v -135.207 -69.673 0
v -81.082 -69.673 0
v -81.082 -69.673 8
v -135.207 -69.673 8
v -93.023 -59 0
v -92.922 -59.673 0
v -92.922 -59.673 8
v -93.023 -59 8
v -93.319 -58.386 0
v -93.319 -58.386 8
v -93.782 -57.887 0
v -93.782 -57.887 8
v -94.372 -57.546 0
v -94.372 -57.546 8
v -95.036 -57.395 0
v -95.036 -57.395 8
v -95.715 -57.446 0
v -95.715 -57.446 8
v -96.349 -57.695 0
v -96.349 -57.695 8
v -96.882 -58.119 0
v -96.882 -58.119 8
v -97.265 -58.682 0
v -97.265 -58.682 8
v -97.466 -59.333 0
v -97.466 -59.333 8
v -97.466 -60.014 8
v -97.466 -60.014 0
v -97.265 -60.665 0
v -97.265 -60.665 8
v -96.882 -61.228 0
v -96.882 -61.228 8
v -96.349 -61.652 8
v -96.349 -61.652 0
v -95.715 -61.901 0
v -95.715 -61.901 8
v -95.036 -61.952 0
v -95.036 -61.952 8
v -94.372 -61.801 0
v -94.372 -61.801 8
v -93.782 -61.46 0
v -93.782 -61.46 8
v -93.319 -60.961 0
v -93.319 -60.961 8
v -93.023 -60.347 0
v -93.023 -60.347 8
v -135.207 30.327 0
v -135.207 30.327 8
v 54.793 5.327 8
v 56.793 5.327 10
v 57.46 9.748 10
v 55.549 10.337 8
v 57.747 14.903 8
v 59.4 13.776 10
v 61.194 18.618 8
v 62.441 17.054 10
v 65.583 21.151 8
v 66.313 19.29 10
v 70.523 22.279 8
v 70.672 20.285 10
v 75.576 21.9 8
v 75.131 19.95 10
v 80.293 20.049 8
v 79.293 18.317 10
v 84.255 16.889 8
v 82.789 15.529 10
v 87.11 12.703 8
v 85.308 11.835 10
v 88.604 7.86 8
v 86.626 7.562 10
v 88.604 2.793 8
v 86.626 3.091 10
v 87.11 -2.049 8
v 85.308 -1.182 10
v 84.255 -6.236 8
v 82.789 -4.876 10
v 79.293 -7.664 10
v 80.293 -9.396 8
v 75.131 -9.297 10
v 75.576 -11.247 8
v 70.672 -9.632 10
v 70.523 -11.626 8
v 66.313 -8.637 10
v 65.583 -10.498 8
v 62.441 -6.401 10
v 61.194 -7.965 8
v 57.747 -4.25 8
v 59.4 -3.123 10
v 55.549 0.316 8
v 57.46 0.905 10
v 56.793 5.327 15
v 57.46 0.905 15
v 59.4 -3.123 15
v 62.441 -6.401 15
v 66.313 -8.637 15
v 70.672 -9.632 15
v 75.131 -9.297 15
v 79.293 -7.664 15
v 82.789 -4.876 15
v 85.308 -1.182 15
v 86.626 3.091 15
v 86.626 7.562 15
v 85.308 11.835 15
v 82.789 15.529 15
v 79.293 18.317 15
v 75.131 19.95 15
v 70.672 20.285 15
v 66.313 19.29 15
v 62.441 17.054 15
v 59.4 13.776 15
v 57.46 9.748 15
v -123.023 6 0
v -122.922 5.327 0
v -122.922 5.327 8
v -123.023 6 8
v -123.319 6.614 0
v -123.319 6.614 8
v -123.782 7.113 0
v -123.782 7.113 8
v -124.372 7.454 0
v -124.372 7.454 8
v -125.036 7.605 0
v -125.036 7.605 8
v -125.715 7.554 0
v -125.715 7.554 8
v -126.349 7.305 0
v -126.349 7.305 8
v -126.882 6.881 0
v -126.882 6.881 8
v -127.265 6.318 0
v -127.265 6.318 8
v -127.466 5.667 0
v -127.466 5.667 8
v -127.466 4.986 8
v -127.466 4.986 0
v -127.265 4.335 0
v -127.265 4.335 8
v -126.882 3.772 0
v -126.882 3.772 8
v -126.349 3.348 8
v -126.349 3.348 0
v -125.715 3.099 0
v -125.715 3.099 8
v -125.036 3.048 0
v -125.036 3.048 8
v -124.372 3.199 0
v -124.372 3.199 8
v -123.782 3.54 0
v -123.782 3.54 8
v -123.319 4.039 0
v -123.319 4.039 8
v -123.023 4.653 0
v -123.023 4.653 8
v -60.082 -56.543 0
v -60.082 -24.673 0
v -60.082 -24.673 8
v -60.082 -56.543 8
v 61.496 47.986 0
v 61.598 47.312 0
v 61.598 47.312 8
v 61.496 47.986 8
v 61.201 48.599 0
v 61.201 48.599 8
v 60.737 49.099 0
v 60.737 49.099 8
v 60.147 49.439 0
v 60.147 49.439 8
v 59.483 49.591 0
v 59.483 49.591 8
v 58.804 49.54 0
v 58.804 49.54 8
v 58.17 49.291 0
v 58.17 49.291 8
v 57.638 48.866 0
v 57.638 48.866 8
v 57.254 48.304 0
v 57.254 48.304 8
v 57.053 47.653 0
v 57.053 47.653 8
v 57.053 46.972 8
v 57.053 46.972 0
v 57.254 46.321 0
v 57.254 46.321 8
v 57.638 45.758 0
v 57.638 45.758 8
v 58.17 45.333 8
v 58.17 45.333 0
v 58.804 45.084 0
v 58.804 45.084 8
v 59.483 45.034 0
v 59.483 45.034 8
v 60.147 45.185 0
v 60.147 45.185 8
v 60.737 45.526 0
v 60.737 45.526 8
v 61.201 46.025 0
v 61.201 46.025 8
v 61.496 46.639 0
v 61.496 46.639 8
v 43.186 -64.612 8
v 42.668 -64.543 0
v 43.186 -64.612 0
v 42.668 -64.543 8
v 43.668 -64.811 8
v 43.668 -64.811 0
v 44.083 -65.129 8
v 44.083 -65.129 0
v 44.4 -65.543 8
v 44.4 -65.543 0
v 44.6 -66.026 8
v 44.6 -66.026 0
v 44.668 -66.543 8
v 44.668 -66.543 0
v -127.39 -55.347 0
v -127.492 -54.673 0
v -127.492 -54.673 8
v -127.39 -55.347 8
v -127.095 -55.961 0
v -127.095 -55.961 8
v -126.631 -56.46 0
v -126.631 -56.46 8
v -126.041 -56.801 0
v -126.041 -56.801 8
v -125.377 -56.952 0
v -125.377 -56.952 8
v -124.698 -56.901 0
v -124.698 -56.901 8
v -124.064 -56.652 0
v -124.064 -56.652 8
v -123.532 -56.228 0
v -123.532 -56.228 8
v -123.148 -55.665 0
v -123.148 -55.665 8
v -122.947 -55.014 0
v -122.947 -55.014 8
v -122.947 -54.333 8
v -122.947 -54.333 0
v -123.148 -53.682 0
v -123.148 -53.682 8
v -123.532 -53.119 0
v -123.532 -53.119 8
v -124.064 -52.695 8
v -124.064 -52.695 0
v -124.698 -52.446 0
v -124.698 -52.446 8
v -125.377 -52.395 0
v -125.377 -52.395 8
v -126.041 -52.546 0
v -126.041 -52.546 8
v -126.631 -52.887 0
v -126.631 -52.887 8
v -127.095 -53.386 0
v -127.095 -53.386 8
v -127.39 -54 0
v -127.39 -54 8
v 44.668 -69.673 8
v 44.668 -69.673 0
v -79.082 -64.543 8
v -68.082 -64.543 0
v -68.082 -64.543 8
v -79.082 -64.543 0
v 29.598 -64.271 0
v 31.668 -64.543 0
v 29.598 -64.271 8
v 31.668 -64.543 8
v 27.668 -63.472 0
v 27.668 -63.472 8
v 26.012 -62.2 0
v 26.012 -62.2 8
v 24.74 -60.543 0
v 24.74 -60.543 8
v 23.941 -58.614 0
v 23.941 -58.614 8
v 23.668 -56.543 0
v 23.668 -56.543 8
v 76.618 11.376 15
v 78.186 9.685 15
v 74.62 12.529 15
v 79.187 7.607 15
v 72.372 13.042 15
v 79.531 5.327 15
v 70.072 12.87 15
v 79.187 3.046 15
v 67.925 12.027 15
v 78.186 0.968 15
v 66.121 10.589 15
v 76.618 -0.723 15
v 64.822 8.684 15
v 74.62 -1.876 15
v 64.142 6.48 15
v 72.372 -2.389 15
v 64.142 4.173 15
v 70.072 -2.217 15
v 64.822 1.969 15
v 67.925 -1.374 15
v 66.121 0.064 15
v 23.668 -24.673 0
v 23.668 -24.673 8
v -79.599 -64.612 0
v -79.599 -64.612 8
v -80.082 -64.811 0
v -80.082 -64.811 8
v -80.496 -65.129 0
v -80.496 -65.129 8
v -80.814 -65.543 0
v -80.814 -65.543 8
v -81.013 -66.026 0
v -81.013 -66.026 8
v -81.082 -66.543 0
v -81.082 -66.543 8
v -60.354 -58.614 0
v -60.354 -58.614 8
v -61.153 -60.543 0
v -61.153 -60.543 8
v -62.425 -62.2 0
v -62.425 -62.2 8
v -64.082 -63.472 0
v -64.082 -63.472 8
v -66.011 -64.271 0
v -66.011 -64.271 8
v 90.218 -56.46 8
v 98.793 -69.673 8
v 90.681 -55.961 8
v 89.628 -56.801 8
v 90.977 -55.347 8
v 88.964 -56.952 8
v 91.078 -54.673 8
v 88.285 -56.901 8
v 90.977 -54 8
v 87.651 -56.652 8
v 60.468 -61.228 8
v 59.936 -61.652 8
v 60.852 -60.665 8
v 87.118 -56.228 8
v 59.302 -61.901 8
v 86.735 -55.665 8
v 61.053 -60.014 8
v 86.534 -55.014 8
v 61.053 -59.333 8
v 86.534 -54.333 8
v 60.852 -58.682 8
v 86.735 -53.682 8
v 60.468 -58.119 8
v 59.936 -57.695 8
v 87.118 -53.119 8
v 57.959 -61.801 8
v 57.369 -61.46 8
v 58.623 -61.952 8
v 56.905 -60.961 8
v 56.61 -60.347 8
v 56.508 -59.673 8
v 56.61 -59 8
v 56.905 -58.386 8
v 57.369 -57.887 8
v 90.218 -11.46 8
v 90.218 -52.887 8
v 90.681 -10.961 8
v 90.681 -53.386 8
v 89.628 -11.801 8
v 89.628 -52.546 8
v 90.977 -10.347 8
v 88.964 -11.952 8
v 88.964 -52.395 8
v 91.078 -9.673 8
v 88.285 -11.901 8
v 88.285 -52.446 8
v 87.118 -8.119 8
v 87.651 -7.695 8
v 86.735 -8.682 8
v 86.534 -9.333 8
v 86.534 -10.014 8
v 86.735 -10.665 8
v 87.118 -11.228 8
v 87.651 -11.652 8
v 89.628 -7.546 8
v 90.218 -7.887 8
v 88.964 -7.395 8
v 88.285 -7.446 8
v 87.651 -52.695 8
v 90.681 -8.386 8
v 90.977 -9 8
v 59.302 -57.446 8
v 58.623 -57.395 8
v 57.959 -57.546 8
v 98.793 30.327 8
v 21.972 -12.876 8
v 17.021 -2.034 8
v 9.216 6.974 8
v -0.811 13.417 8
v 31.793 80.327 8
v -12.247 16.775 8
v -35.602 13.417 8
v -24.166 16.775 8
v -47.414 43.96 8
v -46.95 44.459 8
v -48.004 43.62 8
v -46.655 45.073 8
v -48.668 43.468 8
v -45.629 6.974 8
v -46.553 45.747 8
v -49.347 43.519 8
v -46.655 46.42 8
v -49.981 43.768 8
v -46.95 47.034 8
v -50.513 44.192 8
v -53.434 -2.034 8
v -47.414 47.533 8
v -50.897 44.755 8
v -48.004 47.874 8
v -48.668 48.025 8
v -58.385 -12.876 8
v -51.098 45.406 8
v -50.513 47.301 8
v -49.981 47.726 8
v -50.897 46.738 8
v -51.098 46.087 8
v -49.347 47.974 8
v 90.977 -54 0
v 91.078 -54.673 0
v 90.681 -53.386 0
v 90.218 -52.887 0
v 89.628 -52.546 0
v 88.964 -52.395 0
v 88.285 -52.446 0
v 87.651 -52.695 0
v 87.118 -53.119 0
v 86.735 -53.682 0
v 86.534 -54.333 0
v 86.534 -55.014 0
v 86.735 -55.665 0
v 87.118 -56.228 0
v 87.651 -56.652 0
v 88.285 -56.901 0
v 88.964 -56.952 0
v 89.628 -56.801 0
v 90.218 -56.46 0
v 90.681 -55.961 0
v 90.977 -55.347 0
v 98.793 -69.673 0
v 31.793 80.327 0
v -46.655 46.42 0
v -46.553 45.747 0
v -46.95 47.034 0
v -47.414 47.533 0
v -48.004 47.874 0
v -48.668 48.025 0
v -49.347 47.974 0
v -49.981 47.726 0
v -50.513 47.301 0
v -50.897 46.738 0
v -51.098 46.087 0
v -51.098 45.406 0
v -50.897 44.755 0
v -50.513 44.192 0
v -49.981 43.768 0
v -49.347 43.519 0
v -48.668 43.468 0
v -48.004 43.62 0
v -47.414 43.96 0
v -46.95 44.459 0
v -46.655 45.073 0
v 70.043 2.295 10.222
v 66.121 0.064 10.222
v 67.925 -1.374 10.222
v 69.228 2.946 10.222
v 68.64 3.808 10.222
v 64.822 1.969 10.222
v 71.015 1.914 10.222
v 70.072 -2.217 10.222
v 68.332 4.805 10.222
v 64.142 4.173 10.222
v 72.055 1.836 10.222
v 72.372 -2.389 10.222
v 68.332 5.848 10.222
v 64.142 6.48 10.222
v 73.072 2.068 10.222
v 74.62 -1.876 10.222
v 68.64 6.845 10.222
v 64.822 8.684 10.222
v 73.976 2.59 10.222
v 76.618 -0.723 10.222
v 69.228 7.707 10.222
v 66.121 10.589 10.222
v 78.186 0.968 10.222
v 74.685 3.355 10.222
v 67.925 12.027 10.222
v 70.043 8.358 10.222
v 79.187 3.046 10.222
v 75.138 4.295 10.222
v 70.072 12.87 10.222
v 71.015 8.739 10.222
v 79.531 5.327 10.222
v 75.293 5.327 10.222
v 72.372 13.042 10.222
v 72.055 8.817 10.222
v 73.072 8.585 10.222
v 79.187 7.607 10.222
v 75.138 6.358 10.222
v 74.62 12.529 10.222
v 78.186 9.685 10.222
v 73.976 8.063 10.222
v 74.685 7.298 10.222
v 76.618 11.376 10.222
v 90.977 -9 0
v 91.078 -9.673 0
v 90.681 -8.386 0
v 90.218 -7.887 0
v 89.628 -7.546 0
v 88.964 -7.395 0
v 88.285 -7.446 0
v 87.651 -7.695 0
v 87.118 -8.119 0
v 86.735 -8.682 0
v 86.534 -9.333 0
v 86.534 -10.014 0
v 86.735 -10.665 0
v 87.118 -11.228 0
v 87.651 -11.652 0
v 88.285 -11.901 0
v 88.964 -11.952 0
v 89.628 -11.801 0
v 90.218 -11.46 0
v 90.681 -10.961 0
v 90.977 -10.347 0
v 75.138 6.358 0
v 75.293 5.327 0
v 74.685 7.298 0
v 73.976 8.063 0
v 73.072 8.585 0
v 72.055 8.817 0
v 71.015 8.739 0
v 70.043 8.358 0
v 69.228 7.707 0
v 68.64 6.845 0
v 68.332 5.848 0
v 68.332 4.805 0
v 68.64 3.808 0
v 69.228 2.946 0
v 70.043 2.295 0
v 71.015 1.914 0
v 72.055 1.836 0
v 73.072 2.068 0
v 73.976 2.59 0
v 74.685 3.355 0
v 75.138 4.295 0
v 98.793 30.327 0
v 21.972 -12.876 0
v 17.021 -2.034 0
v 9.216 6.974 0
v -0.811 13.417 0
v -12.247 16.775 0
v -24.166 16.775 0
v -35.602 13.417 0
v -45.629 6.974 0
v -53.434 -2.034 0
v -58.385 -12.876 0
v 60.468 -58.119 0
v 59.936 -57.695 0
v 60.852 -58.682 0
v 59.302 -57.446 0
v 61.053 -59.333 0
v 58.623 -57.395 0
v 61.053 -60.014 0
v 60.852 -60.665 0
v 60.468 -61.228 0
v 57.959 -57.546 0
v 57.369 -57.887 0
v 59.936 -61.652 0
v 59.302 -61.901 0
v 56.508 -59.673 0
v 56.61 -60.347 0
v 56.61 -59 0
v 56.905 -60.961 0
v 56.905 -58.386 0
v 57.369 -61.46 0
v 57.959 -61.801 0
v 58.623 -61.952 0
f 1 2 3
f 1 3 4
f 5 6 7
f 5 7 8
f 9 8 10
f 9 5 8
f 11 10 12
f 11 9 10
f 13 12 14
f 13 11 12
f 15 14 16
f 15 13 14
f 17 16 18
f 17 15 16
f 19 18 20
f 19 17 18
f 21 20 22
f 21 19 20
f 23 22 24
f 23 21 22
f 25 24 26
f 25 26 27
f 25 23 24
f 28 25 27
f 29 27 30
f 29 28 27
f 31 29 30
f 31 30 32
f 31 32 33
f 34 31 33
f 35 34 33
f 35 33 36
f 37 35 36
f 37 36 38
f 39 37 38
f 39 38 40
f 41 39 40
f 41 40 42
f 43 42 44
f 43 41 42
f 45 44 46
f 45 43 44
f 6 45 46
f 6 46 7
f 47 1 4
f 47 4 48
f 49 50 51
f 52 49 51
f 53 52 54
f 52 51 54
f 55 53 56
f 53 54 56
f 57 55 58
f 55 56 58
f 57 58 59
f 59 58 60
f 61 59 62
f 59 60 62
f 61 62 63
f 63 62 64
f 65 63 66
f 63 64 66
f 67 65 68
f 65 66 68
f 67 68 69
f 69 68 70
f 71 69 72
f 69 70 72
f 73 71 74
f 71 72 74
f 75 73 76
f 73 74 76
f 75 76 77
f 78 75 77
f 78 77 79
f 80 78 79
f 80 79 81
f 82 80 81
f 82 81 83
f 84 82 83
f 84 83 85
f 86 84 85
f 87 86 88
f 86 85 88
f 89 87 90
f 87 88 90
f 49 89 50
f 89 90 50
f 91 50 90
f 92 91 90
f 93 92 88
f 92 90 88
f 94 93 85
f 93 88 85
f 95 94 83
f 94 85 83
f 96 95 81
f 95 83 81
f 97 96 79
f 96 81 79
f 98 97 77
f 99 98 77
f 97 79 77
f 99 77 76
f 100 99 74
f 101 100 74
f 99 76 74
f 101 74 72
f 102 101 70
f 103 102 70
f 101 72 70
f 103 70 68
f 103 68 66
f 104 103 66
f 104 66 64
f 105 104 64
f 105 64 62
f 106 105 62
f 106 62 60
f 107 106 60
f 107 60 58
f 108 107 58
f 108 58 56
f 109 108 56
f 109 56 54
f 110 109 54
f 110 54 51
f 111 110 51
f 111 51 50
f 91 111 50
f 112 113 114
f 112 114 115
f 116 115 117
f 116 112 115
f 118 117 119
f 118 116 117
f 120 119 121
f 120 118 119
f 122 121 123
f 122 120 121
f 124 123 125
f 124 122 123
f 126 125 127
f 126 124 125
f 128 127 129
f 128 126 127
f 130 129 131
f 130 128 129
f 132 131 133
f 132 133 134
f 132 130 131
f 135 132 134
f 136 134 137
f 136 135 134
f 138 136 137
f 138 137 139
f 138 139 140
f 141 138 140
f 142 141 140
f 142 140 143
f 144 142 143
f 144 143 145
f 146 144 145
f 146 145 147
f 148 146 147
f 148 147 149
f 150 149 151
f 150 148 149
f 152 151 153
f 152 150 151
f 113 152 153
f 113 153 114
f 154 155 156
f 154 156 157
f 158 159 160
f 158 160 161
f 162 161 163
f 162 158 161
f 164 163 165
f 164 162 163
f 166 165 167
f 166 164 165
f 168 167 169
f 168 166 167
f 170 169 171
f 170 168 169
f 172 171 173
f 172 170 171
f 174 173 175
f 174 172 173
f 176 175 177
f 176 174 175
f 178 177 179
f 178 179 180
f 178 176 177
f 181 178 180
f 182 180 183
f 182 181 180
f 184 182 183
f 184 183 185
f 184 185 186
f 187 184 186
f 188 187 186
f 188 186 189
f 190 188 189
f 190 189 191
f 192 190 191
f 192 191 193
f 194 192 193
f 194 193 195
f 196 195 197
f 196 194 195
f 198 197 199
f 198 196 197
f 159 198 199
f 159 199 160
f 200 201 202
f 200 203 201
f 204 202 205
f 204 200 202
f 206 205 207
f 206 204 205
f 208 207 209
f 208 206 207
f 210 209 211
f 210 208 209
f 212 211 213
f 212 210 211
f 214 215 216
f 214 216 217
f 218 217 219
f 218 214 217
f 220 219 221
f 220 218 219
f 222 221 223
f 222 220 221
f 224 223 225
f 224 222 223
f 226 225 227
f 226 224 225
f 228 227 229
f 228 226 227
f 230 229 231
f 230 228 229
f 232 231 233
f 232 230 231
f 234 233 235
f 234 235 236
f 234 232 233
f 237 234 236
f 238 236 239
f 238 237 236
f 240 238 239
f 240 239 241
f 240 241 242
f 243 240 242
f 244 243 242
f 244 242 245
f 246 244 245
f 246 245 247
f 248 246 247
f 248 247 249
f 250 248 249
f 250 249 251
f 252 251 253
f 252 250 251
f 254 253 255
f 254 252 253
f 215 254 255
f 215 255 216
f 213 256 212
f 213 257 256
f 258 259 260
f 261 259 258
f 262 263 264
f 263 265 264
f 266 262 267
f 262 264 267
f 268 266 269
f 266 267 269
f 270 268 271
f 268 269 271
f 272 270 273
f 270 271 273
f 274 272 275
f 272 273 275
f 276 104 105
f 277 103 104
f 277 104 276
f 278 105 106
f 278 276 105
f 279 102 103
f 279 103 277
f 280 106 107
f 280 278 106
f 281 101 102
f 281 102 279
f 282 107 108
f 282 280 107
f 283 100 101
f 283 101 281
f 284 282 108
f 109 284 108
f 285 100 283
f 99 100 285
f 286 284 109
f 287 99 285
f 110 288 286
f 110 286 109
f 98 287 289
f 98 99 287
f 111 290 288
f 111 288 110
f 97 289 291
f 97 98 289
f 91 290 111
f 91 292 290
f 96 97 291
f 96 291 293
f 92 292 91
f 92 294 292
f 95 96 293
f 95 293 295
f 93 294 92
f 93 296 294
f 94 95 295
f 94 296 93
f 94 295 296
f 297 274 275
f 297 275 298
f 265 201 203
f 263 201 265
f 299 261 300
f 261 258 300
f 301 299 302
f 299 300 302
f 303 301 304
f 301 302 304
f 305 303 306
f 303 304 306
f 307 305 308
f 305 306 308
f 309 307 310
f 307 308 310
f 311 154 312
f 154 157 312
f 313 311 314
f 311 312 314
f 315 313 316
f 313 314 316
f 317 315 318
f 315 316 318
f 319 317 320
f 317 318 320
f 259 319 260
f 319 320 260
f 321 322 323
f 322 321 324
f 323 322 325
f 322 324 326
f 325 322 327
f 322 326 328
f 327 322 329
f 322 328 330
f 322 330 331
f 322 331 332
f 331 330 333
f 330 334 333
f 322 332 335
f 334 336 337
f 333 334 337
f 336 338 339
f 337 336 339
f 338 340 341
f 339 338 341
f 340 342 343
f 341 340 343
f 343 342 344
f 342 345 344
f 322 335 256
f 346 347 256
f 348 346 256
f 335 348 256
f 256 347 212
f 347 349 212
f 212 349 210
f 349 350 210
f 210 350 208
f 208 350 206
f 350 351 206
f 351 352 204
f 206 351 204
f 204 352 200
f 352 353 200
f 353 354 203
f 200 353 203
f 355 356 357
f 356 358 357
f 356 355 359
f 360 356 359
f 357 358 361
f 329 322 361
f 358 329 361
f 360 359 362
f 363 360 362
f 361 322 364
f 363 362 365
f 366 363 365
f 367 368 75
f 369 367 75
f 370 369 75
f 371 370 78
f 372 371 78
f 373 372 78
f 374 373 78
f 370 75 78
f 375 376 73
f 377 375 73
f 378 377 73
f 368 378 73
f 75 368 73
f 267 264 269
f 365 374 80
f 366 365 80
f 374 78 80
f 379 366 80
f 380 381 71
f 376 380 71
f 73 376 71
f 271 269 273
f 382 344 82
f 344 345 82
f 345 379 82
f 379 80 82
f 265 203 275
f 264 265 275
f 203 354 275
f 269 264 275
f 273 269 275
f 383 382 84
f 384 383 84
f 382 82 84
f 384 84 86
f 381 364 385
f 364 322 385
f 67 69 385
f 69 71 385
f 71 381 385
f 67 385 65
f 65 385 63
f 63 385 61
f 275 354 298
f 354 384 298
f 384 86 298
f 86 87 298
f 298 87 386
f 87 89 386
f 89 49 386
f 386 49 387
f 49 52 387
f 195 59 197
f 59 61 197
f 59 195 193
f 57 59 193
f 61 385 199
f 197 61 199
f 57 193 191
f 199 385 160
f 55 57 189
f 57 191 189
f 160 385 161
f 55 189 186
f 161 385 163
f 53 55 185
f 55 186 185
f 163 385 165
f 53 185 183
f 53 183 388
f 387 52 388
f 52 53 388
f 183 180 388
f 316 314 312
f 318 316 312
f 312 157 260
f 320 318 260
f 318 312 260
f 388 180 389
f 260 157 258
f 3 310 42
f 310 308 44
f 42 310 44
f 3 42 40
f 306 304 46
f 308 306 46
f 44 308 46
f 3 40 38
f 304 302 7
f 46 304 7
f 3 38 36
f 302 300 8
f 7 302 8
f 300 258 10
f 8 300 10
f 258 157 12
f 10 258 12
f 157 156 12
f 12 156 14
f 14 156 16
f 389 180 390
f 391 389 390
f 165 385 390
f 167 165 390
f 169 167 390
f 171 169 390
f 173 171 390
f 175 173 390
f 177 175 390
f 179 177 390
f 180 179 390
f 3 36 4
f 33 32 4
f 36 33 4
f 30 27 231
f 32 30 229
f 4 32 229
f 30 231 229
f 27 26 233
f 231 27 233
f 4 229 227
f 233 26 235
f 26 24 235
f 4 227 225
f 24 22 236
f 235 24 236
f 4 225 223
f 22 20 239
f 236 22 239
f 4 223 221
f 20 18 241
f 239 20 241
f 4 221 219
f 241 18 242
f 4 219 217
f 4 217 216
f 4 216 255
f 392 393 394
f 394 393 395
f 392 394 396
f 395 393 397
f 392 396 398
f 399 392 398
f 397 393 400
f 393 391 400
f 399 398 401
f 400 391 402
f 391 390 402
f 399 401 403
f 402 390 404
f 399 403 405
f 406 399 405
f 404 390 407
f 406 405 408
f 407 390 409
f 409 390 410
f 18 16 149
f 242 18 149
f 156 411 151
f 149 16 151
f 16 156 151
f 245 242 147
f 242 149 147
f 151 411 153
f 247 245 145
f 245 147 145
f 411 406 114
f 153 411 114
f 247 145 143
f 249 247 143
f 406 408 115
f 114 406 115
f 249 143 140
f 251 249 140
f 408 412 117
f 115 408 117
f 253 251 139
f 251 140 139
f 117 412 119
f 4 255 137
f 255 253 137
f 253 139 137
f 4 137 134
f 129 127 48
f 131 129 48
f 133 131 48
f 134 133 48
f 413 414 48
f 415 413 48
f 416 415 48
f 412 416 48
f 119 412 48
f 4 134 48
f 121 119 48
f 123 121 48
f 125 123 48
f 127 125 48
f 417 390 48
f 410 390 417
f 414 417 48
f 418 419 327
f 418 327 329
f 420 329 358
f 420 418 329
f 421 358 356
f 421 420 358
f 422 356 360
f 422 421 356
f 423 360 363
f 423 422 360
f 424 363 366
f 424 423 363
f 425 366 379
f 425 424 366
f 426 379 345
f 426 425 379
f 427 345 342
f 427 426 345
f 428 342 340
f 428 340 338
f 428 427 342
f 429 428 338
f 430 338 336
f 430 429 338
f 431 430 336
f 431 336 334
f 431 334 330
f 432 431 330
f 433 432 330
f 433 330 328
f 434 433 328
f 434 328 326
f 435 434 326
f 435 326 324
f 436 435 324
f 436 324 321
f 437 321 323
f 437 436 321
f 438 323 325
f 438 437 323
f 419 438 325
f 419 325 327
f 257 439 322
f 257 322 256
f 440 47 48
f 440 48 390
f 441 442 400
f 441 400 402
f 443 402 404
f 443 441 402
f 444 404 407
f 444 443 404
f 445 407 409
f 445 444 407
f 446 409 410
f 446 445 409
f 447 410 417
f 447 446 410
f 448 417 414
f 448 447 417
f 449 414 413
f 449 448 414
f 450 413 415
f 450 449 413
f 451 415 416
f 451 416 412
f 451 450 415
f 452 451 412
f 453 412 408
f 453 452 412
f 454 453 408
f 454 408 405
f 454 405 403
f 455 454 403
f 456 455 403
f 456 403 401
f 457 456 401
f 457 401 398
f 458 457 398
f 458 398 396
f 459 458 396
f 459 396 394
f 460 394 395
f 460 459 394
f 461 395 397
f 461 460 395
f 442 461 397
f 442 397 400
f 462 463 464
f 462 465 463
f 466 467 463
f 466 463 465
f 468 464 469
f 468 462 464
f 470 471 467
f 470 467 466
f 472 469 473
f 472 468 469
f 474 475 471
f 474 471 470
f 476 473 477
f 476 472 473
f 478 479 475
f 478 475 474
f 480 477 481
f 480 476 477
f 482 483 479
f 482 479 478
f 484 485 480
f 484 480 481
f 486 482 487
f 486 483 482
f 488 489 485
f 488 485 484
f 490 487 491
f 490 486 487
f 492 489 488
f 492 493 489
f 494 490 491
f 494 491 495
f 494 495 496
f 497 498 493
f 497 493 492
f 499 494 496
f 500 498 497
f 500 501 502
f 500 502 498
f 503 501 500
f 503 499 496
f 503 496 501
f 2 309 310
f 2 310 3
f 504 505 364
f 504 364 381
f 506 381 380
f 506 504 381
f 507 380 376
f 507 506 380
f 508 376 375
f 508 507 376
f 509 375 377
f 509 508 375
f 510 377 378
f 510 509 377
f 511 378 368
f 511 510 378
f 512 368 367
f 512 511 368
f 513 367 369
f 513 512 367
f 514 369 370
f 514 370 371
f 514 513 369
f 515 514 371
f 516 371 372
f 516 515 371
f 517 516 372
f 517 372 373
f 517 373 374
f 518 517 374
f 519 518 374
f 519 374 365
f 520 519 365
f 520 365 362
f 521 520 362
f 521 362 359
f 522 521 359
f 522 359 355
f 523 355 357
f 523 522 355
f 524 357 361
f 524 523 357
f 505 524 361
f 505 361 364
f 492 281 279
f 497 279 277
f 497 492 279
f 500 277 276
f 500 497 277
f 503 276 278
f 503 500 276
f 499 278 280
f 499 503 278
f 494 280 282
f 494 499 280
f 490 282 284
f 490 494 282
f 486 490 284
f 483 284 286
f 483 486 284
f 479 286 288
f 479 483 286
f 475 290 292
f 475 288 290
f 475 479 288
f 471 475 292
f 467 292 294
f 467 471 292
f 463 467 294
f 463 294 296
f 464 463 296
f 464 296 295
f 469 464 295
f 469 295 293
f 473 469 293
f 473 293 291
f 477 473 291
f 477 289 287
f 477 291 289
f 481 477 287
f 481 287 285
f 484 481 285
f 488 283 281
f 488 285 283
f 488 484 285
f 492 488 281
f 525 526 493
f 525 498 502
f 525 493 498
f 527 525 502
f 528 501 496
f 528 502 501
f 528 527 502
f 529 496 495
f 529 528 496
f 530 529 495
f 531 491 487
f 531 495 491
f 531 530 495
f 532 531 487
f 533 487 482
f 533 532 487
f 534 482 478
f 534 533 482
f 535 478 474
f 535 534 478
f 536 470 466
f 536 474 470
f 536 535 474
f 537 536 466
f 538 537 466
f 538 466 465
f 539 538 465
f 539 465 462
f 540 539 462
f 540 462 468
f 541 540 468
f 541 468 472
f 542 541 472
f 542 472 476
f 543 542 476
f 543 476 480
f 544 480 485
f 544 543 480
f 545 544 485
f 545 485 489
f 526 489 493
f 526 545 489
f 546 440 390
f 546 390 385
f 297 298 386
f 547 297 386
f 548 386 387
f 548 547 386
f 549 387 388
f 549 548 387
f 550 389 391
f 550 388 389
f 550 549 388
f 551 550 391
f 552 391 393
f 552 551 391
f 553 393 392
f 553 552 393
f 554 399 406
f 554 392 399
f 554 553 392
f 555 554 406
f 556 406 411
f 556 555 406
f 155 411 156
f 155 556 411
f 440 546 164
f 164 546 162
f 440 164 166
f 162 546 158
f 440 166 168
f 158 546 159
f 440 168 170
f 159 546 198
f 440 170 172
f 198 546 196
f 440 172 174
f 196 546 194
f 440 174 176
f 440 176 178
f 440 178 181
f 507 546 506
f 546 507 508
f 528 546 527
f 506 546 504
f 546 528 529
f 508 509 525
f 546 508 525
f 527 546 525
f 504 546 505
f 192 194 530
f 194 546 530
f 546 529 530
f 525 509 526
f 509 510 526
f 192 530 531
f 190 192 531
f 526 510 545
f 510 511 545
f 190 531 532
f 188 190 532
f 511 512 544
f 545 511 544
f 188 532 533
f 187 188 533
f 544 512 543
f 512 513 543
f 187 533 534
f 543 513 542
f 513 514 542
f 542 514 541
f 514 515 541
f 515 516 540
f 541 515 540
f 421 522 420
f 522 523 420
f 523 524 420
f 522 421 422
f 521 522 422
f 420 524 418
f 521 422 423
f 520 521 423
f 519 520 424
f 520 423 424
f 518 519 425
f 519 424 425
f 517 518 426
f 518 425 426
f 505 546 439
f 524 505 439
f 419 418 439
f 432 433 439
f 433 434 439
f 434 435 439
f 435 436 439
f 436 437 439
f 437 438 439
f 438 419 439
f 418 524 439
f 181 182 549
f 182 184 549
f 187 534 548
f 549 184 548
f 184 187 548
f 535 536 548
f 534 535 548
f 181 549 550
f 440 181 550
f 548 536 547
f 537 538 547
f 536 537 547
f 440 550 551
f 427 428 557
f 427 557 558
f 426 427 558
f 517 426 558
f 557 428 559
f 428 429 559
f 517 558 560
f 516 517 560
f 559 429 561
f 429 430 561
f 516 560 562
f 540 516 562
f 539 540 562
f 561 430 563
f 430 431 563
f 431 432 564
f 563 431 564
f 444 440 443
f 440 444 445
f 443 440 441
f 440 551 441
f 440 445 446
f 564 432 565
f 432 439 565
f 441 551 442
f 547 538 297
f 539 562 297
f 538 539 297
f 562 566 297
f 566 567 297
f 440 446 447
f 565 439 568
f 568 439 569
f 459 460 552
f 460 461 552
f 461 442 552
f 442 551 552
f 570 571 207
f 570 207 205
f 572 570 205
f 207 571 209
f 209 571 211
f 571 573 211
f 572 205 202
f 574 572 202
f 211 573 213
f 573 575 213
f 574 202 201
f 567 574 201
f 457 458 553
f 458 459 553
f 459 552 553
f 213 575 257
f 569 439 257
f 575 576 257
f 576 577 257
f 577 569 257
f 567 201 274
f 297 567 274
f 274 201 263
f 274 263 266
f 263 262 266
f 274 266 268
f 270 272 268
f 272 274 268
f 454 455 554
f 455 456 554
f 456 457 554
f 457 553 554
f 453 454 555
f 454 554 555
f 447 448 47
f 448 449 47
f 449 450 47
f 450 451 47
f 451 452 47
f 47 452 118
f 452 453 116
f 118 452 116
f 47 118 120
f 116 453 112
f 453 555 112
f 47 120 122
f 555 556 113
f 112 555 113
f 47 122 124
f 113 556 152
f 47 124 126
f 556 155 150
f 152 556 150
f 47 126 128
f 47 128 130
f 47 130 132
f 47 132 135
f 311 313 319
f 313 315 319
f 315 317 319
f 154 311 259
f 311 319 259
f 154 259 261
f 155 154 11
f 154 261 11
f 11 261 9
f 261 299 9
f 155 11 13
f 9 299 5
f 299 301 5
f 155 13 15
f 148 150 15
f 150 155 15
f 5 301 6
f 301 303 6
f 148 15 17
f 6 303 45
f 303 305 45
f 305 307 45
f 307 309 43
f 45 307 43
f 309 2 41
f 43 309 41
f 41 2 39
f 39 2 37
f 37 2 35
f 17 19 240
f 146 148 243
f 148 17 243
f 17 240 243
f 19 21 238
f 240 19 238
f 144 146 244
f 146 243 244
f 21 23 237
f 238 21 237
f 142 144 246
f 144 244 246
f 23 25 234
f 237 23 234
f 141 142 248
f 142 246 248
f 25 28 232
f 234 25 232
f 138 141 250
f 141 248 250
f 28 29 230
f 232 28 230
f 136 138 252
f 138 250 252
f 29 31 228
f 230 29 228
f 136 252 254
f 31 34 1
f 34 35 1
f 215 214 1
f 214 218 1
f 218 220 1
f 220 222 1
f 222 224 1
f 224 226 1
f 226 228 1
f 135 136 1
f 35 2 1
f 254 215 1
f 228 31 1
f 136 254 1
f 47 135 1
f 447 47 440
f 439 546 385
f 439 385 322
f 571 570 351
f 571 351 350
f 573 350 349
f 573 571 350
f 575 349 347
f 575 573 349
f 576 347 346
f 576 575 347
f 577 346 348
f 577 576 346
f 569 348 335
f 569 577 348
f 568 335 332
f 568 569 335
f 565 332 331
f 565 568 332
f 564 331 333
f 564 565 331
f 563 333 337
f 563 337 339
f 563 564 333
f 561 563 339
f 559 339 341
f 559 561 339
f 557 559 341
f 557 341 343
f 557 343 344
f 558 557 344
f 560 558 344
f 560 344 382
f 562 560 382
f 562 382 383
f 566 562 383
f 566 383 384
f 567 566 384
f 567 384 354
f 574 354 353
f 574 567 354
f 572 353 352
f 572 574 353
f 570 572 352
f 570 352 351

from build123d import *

# Parameters (mm, degrees)
SKETCH1_R               = 2.285
BOSS_EXTRUDE1_DEPTH     = 8
SKETCH2_R               = 15
BOSS_EXTRUDE2_DEPTH     = 15
CUT_EXTRUDE1_DEPTH      = 18
CUT_EXTRUDE1_DEPTH_BACK = 2
SKETCH3_R               = 3.5
CUT_EXTRUDE2_START      = 10.222
SKETCH4_R               = 7.7375
CUT_EXTRUDE2_DEPTH      = 6
FILLET1_R               = 8
FILLET2_R               = 2
CHAMFER1_SIZE           = 2


with BuildPart() as part:
    # Sketch1 → Boss-Extrude1 (new body)
    with BuildSketch(Plane.XY):
        Polygon((-135.206606908, -69.673474959), (-135.206606908, 30.326525041), (31.793393092, 80.326525041), (98.793393092, 30.326525041), (98.793393092, -69.673474959), align=None)
        with Locations((-125.206606908, 5.326525041)):
            Circle(SKETCH1_R, mode=Mode.SUBTRACT)
        with Locations((-95.206606908, -59.673474959)):
            Circle(SKETCH1_R, mode=Mode.SUBTRACT)
        with Locations((59.312548963, 47.312193908)):
            Circle(SKETCH1_R, mode=Mode.SUBTRACT)
        with Locations((-48.838391267, 45.7466848)):
            Circle(SKETCH1_R, mode=Mode.SUBTRACT)
        with Locations(Location((58.793393092, -59.673474959, 0), (0, 0, 180))):
            Circle(SKETCH1_R, mode=Mode.SUBTRACT)
        with Locations(Location((-125.206606908, -54.673474959, 0), (0, 0, 180))):
            Circle(SKETCH1_R, mode=Mode.SUBTRACT)
        with Locations((88.793393092, -54.673474959)):
            Circle(SKETCH1_R, mode=Mode.SUBTRACT)
        with Locations((88.793393092, -9.673474959)):
            Circle(SKETCH1_R, mode=Mode.SUBTRACT)
    extrude(amount=BOSS_EXTRUDE1_DEPTH)

    # Sketch2 → Boss-Extrude2 (add)
    with BuildSketch(Plane.XY):
        with Locations(Location((71.793393092, 5.326525041, 0), (0, 0, 180))):
            Circle(SKETCH2_R)
    extrude(amount=BOSS_EXTRUDE2_DEPTH)

    # Sketch3 → Cut-Extrude1 (cut, two sides: drawn at the far end of the back side and taken through both)
    with BuildSketch(Plane.XY.offset(-CUT_EXTRUDE1_DEPTH_BACK)):
        with Locations((71.793393092, 5.326525041)):
            Circle(SKETCH3_R)
        with BuildLine():
            Line((44.668393092, -69.673474959), (44.668393092, -64.543474959))
            Line((44.668393092, -64.543474959), (23.668393092, -64.543474959))
            Line((23.668393092, -64.543474959), (23.668393092, -24.673474959))
            ThreePointArc((23.668393092, -24.673474959), (-18.206606908, 17.201525041), (-60.081606908, -24.673474959))
            Line((-60.081606908, -24.673474959), (-60.081606908, -64.543474959))
            Line((-60.081606908, -64.543474959), (-81.081606908, -64.543474959))
            Line((-81.081606908, -64.543474959), (-81.081606908, -69.673474959))
            Line((-81.081606908, -69.673474959), (-81.081606908, -72.333497989))
            Line((-81.081606908, -72.333497989), (44.668393092, -72.333497989))
            Line((44.668393092, -72.333497989), (44.668393092, -69.673474959))
        make_face()
    extrude(amount=CUT_EXTRUDE1_DEPTH + CUT_EXTRUDE1_DEPTH_BACK, mode=Mode.SUBTRACT)

    # Sketch4 → Cut-Extrude2 (cut)
    with BuildSketch(Plane.XY.offset(CUT_EXTRUDE2_START)):
        with Locations((71.793393092, 5.326525041)):
            Circle(SKETCH4_R)
    extrude(amount=CUT_EXTRUDE2_DEPTH, mode=Mode.SUBTRACT)

    # Fillet1
    fillet1_edges = [part.edges().sort_by_distance(p)[0] for p in [
        (23.668393092, -64.543474959, 4),
        (-60.081606908, -64.543474959, 4),
    ]]
    fillet(fillet1_edges, radius=FILLET1_R)

    # Fillet2
    fillet2_edges = [part.edges().sort_by_distance(p)[0] for p in [
        (-81.081606908, -64.543474959, 4),
        (44.668393092, -64.543474959, 4),
    ]]
    fillet(fillet2_edges, radius=FILLET2_R)

    # Chamfer1
    chamfer1_edges = [part.edges().sort_by_distance(p)[0] for p in [
        (86.793393092, 5.326525041, 8),
    ]]
    chamfer(chamfer1_edges, length=CHAMFER1_SIZE)


solid = part.part
